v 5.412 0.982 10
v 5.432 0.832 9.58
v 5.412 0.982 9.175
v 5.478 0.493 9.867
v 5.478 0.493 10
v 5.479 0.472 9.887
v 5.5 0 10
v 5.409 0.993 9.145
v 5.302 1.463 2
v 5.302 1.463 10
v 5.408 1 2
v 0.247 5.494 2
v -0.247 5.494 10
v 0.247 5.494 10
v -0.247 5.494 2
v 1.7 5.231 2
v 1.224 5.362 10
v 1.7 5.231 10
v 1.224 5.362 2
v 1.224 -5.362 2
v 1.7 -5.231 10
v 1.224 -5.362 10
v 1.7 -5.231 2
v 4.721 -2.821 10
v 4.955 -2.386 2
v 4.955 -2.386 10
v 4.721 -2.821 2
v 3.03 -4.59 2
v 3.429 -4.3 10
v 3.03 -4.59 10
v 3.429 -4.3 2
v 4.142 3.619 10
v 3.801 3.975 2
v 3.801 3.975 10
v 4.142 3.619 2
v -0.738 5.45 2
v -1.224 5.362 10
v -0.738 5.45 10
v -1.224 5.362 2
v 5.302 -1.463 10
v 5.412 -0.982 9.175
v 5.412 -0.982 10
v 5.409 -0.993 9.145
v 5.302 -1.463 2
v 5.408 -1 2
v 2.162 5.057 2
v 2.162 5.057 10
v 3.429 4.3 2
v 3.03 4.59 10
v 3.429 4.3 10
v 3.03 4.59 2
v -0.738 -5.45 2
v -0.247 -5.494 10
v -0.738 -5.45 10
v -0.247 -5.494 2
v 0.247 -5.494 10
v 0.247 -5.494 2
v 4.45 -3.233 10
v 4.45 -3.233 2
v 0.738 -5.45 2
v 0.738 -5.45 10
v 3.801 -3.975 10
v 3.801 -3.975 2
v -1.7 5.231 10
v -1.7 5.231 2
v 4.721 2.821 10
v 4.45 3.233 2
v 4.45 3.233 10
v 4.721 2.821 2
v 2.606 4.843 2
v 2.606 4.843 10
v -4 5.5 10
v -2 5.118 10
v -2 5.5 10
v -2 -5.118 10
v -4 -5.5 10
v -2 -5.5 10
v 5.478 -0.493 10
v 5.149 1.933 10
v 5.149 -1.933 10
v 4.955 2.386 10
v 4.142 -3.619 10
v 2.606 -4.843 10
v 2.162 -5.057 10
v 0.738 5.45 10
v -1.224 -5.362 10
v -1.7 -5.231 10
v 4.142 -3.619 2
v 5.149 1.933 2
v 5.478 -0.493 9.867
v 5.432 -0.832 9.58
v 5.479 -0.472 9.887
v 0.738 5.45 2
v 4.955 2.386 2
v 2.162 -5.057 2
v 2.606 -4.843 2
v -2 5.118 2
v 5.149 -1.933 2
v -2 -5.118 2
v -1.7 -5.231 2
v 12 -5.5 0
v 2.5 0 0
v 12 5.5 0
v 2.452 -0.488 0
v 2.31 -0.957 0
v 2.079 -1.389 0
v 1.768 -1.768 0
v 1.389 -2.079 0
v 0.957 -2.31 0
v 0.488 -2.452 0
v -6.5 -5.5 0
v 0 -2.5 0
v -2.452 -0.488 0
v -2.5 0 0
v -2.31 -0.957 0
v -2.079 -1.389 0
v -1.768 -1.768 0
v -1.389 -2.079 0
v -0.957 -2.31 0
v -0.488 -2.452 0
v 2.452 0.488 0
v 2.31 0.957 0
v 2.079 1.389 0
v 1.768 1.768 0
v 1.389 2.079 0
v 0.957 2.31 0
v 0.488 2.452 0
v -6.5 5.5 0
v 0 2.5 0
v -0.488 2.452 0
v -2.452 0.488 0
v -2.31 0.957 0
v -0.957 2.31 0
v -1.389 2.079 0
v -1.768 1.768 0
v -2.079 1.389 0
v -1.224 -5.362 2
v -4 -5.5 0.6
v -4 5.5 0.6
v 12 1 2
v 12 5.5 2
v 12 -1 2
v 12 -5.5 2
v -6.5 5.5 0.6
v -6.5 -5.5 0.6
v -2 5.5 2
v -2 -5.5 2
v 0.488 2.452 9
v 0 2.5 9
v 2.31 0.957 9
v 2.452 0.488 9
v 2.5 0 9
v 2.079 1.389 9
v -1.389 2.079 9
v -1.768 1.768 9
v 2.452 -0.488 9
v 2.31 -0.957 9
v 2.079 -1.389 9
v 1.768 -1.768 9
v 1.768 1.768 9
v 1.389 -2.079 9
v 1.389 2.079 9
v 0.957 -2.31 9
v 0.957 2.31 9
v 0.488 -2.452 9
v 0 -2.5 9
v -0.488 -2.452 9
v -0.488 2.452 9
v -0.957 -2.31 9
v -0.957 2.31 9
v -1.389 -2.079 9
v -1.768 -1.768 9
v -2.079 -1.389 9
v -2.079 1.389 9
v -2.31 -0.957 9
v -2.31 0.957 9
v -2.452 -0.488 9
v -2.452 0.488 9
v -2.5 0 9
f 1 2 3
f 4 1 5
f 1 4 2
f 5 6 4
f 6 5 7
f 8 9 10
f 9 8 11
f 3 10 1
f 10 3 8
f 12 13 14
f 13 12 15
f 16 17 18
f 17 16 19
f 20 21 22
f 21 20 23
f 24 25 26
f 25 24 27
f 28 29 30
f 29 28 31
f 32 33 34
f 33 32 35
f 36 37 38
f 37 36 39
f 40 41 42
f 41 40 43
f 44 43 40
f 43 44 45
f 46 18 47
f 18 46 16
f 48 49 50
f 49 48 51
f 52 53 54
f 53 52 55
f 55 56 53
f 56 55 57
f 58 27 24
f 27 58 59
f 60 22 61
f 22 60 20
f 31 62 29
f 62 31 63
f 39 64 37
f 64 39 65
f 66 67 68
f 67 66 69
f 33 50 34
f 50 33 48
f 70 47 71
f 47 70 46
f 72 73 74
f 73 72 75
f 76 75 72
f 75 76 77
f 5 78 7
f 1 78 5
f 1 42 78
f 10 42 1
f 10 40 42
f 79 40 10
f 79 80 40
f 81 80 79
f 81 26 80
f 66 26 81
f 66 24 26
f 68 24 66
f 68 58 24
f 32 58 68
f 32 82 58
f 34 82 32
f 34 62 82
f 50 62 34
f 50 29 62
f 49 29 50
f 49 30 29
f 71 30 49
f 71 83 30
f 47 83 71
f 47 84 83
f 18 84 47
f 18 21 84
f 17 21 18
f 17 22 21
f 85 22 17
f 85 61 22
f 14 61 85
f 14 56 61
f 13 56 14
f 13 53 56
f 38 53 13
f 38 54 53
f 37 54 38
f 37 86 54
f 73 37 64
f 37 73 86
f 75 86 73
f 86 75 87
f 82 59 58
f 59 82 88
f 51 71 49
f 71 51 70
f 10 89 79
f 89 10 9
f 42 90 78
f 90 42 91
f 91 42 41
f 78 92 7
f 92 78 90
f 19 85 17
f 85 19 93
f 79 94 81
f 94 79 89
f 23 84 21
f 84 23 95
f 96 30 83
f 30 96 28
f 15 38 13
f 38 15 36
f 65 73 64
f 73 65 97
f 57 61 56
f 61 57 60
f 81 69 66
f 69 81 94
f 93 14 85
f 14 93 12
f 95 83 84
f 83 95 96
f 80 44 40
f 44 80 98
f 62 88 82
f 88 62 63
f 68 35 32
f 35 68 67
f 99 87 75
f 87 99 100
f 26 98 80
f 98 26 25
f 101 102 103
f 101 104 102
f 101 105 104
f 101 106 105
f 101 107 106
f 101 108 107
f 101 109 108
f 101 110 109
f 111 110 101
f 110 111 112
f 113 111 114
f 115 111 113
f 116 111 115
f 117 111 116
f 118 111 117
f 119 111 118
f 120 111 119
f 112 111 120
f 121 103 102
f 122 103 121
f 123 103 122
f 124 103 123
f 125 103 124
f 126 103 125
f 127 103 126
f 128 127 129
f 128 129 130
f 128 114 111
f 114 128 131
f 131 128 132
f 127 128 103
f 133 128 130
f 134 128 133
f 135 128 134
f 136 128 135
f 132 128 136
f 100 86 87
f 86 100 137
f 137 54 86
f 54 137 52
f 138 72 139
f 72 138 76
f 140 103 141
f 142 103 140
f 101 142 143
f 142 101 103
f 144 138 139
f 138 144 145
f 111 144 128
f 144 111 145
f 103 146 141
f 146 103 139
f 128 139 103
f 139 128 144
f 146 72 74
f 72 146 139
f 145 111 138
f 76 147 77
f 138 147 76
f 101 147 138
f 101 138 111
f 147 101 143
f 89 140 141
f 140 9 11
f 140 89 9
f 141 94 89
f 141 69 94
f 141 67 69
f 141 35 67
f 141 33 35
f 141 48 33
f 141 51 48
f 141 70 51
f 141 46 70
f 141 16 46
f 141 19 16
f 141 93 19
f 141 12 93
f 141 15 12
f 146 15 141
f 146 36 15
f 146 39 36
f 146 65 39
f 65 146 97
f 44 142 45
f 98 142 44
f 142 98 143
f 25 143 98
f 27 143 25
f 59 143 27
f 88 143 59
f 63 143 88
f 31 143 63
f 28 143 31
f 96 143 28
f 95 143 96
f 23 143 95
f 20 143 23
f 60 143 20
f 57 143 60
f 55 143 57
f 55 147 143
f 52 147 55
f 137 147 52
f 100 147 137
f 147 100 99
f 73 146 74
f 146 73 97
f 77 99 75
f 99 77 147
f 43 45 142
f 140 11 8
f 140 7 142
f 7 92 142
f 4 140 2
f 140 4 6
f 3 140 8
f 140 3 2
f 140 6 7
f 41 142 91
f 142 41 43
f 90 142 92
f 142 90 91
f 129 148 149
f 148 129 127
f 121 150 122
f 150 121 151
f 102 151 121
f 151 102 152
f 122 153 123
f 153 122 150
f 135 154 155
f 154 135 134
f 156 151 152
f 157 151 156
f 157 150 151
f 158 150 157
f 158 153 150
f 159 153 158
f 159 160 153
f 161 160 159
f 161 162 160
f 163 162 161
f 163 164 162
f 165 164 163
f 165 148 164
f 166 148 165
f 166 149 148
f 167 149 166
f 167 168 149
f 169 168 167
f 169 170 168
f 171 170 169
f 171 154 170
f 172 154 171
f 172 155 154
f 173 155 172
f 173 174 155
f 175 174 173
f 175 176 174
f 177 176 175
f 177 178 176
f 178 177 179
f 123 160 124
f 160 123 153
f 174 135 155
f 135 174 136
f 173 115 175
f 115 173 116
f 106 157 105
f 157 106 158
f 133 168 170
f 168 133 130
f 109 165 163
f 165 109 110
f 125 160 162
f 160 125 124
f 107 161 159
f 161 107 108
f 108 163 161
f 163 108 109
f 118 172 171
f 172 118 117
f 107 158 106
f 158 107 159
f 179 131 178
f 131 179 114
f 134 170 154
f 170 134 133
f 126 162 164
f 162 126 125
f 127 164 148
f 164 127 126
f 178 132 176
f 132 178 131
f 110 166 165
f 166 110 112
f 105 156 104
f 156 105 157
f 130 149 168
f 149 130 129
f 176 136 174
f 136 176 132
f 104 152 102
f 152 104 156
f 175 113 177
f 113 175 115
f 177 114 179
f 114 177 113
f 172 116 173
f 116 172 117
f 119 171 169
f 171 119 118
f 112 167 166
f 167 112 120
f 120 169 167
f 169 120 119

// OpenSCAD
//Shelf holder for light table
//Project: backlight table, ended up not using
$fa=1;
$fs=0.5;
difference() {
  union() {
    translate([-6.5,-5.5,0])cube([18.5,11,0.6]);
    translate([-4,-5.5,0])cube([16,11,2]);
    translate([-4,-5.5,0])cube([2,11,10]);
    intersection() {
      cylinder(h=10,d=11);
      translate([-4,-5.5,0])cube([16,11,10]);
    }
    hull() {
      translate([-4,-1,0]) cube([16,2,2]);
      translate([4.5,0,0])cylinder(h=10,d=2);
    }
  }
cylinder(h=9,d=5);
}
